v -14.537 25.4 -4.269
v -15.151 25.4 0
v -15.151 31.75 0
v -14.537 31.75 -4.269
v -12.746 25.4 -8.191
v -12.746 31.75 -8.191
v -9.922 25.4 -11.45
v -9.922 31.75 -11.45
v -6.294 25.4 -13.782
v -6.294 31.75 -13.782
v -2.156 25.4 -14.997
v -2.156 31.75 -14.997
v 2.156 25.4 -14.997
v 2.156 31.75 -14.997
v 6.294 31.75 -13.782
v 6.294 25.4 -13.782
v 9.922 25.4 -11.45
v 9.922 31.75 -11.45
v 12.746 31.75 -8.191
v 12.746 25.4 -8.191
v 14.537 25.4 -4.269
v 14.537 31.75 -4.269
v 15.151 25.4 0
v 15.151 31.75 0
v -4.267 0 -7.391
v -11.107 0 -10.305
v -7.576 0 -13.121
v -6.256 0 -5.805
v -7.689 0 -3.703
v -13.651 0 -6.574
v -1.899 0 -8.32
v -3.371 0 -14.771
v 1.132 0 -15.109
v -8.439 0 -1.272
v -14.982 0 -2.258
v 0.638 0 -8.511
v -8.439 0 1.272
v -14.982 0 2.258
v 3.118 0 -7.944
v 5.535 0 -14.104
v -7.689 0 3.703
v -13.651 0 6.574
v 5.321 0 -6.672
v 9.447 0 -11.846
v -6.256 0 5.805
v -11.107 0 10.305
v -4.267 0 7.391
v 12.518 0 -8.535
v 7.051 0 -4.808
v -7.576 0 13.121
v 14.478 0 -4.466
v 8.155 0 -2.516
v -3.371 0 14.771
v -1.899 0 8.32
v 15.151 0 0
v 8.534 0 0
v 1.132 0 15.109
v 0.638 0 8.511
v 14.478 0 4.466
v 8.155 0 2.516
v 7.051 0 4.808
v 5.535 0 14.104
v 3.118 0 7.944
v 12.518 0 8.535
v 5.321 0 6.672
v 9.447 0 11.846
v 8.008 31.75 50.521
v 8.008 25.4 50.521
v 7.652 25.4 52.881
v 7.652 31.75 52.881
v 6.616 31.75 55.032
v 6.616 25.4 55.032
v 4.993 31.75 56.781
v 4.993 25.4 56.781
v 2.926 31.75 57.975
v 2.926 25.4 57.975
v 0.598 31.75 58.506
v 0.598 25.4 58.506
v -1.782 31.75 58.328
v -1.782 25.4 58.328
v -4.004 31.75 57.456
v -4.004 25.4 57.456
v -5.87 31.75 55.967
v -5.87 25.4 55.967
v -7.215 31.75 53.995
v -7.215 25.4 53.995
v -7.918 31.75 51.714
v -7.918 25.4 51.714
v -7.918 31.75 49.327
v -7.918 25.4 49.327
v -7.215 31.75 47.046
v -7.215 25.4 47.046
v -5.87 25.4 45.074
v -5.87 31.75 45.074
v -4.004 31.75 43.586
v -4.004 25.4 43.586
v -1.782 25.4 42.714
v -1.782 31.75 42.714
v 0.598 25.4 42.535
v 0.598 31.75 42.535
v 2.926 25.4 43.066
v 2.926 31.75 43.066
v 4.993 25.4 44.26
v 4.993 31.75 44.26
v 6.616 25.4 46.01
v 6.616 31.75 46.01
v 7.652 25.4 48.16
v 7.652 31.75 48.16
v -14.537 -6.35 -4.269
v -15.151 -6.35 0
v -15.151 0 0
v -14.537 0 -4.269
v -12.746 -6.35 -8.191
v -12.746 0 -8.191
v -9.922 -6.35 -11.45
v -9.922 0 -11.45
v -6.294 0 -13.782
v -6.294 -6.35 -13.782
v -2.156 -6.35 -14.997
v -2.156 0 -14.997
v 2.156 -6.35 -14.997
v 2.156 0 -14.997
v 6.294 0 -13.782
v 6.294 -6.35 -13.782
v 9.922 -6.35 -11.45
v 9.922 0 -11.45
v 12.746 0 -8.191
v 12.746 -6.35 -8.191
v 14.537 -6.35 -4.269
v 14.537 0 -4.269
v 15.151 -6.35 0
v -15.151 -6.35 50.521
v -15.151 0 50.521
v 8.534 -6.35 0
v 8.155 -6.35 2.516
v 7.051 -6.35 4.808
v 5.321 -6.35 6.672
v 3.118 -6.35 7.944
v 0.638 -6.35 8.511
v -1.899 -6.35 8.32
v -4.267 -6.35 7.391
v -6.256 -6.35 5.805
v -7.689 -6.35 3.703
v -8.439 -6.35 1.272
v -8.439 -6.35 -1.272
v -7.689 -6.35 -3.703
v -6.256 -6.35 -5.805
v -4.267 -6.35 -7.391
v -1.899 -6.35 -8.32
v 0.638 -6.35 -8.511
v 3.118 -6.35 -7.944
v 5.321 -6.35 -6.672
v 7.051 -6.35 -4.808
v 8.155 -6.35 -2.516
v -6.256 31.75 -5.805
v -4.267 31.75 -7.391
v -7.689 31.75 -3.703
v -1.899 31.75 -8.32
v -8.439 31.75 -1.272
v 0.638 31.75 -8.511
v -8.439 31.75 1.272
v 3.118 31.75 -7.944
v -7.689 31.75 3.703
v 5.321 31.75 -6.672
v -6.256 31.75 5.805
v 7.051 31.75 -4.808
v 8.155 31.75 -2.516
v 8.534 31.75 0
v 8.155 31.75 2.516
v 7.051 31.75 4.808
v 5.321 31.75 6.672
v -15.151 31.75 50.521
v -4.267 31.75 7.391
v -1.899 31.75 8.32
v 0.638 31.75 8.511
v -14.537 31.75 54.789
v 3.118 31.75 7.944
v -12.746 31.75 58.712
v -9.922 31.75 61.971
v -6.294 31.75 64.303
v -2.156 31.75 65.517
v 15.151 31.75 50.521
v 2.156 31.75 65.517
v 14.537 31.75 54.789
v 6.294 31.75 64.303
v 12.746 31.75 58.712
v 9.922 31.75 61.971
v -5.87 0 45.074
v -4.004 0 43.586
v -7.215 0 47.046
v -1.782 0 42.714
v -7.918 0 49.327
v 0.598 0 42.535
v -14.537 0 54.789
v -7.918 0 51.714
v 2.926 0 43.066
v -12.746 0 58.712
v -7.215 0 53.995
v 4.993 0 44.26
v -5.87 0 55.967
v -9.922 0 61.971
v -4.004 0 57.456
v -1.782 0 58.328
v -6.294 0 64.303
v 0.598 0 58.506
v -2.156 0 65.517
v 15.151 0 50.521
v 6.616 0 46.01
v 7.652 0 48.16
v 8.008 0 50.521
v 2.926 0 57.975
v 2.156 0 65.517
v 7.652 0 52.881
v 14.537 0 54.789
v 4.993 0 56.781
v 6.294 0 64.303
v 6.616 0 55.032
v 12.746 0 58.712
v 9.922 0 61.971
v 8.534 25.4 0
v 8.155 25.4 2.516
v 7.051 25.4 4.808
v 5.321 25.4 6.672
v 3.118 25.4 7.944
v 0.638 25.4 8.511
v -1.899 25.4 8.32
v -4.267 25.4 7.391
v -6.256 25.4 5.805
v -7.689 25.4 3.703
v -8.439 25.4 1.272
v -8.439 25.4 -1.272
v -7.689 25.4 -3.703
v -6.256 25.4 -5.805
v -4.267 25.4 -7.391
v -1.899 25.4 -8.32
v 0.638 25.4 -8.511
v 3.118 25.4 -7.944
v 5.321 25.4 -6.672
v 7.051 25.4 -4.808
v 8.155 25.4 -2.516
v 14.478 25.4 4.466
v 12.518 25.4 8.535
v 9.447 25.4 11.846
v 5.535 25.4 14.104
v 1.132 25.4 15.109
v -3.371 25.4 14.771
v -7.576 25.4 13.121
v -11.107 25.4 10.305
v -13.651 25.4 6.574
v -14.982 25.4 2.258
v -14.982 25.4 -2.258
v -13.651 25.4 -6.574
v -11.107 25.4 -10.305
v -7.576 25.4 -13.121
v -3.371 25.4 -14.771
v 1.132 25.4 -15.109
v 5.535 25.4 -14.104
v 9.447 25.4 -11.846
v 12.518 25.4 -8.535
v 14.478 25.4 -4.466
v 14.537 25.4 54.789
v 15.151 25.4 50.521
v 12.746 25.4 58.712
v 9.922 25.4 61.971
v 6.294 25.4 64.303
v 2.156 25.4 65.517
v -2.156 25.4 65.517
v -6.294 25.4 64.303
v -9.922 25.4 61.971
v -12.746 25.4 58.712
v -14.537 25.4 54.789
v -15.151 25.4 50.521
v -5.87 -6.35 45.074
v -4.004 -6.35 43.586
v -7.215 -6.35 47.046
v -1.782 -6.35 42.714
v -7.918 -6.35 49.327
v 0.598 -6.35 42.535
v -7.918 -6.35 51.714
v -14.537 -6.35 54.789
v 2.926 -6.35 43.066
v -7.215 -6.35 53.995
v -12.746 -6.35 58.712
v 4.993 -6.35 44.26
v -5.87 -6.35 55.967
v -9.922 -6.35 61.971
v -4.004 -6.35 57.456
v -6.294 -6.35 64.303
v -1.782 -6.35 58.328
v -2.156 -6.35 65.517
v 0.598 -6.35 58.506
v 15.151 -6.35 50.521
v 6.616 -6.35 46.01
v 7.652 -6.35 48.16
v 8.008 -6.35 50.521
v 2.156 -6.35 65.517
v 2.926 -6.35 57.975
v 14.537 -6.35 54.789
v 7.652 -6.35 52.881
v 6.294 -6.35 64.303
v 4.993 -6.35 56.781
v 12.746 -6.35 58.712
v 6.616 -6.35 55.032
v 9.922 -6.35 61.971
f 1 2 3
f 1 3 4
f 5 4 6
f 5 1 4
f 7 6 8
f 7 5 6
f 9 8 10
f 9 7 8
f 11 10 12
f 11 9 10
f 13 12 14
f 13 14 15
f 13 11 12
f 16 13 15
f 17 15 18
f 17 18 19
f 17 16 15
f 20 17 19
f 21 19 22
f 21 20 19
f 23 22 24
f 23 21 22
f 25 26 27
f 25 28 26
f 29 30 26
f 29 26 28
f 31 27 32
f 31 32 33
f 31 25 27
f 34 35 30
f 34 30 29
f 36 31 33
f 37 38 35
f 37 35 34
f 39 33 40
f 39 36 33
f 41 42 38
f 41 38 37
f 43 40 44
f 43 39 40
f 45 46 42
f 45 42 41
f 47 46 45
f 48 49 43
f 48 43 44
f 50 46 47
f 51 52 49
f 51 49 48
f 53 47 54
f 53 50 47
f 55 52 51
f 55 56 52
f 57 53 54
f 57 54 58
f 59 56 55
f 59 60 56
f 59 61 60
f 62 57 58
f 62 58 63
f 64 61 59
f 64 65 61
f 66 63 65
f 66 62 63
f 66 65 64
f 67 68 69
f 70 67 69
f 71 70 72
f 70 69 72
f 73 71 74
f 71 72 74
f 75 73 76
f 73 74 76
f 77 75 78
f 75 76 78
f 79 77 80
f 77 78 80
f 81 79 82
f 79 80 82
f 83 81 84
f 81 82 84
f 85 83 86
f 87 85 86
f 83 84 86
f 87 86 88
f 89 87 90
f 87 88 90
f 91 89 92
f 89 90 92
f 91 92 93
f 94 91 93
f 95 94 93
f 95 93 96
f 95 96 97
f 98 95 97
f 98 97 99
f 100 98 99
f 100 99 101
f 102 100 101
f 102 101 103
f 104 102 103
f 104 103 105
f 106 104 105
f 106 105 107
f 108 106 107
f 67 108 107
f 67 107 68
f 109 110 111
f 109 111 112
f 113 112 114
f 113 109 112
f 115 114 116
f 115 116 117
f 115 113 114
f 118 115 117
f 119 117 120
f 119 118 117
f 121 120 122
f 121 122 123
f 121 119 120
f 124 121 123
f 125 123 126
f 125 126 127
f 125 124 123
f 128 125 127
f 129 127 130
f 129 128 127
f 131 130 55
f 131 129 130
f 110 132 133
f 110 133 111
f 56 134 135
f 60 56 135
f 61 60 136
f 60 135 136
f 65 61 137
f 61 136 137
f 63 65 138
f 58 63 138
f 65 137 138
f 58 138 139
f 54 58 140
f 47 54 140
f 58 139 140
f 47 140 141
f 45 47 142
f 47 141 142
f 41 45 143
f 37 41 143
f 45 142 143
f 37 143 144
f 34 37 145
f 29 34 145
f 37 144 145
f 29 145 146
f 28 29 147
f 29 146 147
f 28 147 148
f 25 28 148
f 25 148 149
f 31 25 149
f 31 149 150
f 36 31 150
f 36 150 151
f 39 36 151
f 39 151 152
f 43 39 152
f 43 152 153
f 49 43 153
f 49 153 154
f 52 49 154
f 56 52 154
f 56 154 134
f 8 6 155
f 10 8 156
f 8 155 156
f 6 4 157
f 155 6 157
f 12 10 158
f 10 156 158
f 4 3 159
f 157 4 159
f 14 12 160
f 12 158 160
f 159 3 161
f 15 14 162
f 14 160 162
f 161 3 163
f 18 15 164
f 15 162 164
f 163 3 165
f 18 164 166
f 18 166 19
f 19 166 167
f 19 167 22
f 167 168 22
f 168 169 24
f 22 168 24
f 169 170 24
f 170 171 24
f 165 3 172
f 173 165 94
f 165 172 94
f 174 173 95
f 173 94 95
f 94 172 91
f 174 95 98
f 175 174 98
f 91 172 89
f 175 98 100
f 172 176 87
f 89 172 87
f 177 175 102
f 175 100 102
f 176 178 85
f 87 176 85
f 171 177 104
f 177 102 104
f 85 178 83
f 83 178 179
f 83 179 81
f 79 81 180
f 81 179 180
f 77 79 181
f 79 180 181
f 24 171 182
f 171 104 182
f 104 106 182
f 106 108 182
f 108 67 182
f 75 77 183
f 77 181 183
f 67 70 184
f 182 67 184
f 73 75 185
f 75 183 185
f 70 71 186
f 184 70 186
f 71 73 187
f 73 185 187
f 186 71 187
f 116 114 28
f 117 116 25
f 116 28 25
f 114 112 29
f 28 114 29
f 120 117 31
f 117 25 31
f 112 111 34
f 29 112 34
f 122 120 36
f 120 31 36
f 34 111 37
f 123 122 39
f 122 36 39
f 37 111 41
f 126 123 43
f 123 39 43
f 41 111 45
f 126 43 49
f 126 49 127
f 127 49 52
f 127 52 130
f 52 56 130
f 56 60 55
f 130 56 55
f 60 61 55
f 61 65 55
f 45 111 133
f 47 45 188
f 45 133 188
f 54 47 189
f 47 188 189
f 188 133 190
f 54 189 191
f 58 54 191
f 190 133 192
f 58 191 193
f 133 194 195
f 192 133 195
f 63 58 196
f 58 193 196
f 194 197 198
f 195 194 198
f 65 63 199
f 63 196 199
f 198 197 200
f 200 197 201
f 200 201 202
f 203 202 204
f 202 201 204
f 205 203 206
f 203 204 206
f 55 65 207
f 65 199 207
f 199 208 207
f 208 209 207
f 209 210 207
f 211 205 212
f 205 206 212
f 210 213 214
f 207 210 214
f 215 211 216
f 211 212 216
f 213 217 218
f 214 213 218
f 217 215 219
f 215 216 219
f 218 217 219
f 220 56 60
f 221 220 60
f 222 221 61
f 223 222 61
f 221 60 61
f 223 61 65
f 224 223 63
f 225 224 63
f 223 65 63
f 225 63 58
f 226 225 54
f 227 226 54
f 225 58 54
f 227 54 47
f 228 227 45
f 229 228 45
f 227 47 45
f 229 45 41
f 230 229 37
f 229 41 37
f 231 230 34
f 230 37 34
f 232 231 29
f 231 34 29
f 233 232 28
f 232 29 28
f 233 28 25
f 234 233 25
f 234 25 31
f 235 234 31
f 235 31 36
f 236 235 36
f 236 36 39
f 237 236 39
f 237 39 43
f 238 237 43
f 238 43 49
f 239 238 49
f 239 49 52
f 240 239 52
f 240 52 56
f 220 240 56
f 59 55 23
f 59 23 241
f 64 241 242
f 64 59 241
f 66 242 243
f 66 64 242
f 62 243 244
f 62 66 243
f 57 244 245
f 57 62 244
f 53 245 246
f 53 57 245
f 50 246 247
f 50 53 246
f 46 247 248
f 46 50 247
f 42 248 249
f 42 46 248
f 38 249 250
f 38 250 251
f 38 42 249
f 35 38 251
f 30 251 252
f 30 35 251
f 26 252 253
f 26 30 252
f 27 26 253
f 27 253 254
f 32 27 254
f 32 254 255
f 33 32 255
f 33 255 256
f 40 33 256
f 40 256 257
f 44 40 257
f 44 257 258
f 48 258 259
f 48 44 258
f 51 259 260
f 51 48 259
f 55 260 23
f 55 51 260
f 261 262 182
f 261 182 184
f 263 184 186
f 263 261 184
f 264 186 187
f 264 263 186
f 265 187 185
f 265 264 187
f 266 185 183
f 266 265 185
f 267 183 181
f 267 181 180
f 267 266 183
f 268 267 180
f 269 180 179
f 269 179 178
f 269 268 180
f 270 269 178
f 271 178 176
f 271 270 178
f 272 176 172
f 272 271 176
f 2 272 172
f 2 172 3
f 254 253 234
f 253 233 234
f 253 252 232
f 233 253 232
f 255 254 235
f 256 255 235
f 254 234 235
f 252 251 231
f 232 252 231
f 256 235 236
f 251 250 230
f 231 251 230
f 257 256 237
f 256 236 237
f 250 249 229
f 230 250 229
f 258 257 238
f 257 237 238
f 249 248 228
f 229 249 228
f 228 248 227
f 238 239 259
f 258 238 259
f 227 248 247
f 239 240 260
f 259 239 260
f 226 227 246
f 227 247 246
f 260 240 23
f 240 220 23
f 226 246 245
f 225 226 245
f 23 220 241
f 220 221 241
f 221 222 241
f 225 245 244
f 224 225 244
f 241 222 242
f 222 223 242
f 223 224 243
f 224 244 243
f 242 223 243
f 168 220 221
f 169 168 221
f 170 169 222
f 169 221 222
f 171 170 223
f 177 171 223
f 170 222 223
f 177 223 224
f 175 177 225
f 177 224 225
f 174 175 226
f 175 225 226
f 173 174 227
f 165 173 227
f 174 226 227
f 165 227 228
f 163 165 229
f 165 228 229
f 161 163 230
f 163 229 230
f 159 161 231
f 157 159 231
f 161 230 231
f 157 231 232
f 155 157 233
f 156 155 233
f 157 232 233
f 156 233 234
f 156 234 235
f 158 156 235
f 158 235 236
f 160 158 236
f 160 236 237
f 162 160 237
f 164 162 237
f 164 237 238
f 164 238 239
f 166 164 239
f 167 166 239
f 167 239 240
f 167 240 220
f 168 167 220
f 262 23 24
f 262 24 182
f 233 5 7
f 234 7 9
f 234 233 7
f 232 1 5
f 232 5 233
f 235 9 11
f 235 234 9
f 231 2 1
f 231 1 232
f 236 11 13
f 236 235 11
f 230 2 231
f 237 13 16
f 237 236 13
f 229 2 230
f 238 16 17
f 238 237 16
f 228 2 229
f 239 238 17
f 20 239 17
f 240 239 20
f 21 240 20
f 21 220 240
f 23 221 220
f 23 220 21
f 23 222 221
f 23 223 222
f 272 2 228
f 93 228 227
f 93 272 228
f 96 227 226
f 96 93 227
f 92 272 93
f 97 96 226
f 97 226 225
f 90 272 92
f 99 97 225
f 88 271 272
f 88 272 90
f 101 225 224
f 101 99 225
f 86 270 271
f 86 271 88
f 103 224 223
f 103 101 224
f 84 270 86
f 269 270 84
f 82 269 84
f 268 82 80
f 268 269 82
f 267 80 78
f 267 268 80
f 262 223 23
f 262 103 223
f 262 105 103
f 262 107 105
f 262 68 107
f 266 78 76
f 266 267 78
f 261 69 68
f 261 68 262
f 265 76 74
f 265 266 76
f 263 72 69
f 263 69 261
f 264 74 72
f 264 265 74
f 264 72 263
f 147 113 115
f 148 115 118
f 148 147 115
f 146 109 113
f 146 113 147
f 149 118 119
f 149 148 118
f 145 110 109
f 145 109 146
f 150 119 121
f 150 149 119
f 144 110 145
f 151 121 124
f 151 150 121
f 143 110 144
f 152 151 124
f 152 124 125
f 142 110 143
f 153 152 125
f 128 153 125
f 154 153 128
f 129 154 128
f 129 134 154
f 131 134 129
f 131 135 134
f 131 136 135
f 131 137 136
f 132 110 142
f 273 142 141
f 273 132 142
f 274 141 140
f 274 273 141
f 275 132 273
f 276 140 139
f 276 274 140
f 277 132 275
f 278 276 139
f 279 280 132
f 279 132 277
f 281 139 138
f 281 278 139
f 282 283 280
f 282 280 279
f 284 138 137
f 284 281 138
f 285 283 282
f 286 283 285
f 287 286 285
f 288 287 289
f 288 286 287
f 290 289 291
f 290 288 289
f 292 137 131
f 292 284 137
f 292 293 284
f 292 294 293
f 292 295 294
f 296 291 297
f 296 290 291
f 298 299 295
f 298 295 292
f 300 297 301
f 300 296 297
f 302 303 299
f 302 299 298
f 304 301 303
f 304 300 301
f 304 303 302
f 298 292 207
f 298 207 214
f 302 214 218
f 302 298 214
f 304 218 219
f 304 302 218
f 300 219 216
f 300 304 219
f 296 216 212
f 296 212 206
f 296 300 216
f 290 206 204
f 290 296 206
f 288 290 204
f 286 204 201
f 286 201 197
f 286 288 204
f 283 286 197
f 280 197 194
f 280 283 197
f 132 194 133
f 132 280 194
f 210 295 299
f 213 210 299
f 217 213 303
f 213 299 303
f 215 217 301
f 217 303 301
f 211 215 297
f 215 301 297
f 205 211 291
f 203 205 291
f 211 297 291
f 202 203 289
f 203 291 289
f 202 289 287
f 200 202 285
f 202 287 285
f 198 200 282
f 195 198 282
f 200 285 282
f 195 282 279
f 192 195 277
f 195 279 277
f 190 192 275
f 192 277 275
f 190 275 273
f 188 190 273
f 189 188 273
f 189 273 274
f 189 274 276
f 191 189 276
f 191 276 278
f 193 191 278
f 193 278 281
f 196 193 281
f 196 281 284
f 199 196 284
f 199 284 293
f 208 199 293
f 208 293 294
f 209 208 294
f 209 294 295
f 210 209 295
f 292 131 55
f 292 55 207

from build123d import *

# Parameters (mm, degrees)
F1_DEPTH = 6.35
F2_DEPTH = 31.75
F3_DEPTH = 25.4
F4_DEPTH = 25.4
F5_R     = 8.007748
F5_R_2   = 8.5344
F6_DEPTH = 38.101


with BuildPart() as f1:
    # F0 (on Front) → F1 (new body)
    with BuildSketch(Plane.XZ):
        with BuildLine():
            ThreePointArc((-15.1511, 50.5206), (0, 35.3695), (15.1511, 50.5206))
            ThreePointArc((15.1511, 50.5206), (0, 65.6717), (-15.1511, 50.5206))
        make_face()
        with BuildLine():
            ThreePointArc((-15.1511, 0), (0, 15.1511), (15.1511, 0))
            Line((15.1511, 0), (15.1511, 50.5206))
            ThreePointArc((15.1511, 50.5206), (0, 35.3695), (-15.1511, 50.5206))
            Line((-15.1511, 50.5206), (-15.1511, 0))
        make_face()
        with BuildLine():
            ThreePointArc((-15.1511, 0), (0, -15.1511), (15.1511, 0))
            ThreePointArc((15.1511, 0), (0, 15.1511), (-15.1511, 0))
        make_face()
    extrude(amount=F1_DEPTH)

    # F0 (on Front) → F2 (join)
    with BuildSketch(Plane.XZ):
        with BuildLine():
            ThreePointArc((-15.1511, 0), (0, -15.1511), (15.1511, 0))
            ThreePointArc((15.1511, 0), (0, 15.1511), (-15.1511, 0))
        make_face()
        with BuildLine():
            ThreePointArc((-15.1511, 0), (0, 15.1511), (15.1511, 0))
            Line((15.1511, 0), (15.1511, 50.5206))
            ThreePointArc((15.1511, 50.5206), (0, 35.3695), (-15.1511, 50.5206))
            Line((-15.1511, 50.5206), (-15.1511, 0))
        make_face()
        with BuildLine():
            ThreePointArc((-15.1511, 50.5206), (0, 35.3695), (15.1511, 50.5206))
            ThreePointArc((15.1511, 50.5206), (0, 65.6717), (-15.1511, 50.5206))
        make_face()
    extrude(amount=-F2_DEPTH)

    # F0 (on Front) → F3 (cut)
    with BuildSketch(Plane.XZ):
        with BuildLine():
            ThreePointArc((-15.1511, 0), (0, -15.1511), (15.1511, 0))
            ThreePointArc((15.1511, 0), (0, 15.1511), (-15.1511, 0))
        make_face()
        with BuildLine():
            ThreePointArc((-15.1511, 0), (0, 15.1511), (15.1511, 0))
            Line((15.1511, 0), (15.1511, 50.5206))
            ThreePointArc((15.1511, 50.5206), (0, 35.3695), (-15.1511, 50.5206))
            Line((-15.1511, 50.5206), (-15.1511, 0))
        make_face()
        with BuildLine():
            ThreePointArc((-15.1511, 50.5206), (0, 35.3695), (15.1511, 50.5206))
            ThreePointArc((15.1511, 50.5206), (0, 65.6717), (-15.1511, 50.5206))
        make_face()
    extrude(amount=-F3_DEPTH, mode=Mode.SUBTRACT)


with BuildPart() as f4:
    # F0 (on Front) → F4 (new body)
    with BuildSketch(Plane.XZ):
        with BuildLine():
            ThreePointArc((-15.1511, 0), (0, -15.1511), (15.1511, 0))
            ThreePointArc((15.1511, 0), (0, 15.1511), (-15.1511, 0))
        make_face()
    extrude(amount=-F4_DEPTH)


with BuildPart() as f6_tool:
    # F5 (on face) → F6 (new body, through all)
    with BuildSketch(Plane.XZ.offset(6.35)):
        with Locations((0, 50.5206)):
            Circle(F5_R)
        Circle(F5_R_2)
    extrude(amount=-F6_DEPTH)


with BuildPart() as f1_1:
    add(f1.part)

    # F6: cut by f6_tool
    add(f6_tool.part, mode=Mode.SUBTRACT)


with BuildPart() as f4_1:
    add(f4.part)

    # F6: cut by f6_tool
    add(f6_tool.part, mode=Mode.SUBTRACT)


solid = Compound([f1_1.part, f4_1.part])
